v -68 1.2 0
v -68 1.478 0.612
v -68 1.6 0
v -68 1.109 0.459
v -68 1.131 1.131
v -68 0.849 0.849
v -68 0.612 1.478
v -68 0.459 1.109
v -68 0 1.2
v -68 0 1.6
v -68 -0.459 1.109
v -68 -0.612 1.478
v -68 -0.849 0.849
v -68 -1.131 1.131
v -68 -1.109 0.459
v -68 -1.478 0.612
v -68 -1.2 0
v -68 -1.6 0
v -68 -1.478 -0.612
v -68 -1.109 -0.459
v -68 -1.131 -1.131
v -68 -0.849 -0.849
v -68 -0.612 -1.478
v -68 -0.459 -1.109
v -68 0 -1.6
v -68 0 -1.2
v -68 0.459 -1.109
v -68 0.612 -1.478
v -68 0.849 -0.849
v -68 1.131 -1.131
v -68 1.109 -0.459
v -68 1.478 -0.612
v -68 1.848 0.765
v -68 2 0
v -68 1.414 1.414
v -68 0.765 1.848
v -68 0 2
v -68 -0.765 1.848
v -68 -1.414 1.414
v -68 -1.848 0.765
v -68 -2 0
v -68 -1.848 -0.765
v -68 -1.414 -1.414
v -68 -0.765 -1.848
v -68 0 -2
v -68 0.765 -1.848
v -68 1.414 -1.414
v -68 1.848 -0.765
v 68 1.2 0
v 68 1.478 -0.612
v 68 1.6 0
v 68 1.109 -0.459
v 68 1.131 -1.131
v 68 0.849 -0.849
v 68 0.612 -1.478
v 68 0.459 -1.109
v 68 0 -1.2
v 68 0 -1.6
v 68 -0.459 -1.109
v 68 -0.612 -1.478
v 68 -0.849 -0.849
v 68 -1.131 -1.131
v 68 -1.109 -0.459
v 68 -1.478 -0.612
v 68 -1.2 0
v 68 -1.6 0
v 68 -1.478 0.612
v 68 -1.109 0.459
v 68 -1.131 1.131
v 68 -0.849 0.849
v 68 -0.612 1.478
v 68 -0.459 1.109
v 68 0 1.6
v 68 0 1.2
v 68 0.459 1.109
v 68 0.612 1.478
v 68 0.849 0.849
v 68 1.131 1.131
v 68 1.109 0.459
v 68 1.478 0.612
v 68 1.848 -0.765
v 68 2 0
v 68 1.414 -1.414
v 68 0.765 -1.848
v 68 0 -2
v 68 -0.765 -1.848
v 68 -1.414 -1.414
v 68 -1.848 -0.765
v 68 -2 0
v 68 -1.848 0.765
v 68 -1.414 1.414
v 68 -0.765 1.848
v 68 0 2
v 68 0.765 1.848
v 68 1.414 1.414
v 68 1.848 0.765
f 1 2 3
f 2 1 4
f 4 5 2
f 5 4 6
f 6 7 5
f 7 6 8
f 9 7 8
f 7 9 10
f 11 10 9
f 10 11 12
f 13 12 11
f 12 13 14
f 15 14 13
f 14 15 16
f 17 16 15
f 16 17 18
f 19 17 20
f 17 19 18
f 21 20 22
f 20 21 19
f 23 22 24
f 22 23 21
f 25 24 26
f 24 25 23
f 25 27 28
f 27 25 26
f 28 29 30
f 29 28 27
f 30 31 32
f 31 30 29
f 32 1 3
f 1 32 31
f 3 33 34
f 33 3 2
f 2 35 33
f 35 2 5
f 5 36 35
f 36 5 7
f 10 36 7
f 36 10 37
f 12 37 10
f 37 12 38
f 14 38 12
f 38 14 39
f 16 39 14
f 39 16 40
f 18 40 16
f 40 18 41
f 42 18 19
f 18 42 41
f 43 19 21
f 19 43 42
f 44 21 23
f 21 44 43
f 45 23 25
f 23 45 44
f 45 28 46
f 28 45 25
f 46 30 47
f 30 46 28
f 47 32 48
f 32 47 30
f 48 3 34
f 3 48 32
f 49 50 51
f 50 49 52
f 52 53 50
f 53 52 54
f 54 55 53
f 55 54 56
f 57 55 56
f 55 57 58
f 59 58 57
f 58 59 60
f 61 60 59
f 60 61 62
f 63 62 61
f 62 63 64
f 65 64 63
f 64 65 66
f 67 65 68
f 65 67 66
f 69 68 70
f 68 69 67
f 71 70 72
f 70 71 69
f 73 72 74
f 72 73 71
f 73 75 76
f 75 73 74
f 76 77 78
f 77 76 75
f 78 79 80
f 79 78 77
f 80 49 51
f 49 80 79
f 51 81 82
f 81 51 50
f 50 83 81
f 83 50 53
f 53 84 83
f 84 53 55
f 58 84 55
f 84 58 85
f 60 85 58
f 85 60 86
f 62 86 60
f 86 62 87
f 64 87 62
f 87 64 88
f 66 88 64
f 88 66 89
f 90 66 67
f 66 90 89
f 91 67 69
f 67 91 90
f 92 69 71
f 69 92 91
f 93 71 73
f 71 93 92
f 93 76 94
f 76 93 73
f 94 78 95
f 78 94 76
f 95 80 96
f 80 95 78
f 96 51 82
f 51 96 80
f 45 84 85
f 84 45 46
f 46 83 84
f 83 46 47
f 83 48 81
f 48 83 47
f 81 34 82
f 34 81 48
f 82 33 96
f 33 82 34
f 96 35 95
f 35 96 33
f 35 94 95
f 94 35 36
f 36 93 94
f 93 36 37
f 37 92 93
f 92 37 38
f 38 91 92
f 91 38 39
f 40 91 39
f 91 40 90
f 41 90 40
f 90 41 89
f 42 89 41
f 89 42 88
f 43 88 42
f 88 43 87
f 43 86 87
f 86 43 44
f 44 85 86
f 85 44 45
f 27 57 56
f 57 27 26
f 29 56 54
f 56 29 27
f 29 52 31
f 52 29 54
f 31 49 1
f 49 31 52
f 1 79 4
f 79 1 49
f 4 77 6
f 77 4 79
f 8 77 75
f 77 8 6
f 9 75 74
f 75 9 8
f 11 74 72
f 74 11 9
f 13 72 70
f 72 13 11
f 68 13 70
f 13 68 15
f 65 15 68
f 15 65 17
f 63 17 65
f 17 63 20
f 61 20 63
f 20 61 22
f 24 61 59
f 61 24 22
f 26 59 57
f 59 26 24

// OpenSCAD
// file: ../p/4-4cyli.scad
use <../lib.scad>
function ldraw_lib__4_4cyli() = [
// 0 Cylinder 1.0
// 0 Name: 4-4cyli.dat
// 0 Author: James Jessiman
// 0 !LDRAW_ORG Primitive UPDATE 2005-01
// 0 !LICENSE Licensed under CC BY 2.0 and CC BY 4.0 : see CAreadme.txt
// 
// 0 BFC CERTIFY CCW
  [0,"BFC","CERTIFY"],
  [0,"BFC","CCW"],
// 
// 0 !HISTORY 1998-12-15 [PTadmin] Official Update 1998-10
// 0 !HISTORY 2002-03-23 [sbliss] Added BFC statement; merged headers from files in distributions LDraw 0.27 and Complete.
// 0 !HISTORY 2002-04-25 [PTadmin] Official Update 2002-02
// 0 !HISTORY 2004-12-14 [guyvivan] BFC CCW
// 0 !HISTORY 2005-12-28 [PTadmin] Official Update 2005-01
// 0 !HISTORY 2007-06-24 [PTadmin] Header formatted for Contributor Agreement
// 0 !HISTORY 2008-07-01 [PTadmin] Official Update 2008-01
// 
// 
// 4 16 1 1 0 0.9239 1 0.3827 0.9239 0 0.3827 1 0 0
  [4,16,1,1,0,0.9239,1,0.3827,0.9239,0,0.3827,1,0,0],
// 5 24 1 0 0 1 1 0 0.9239 0 0.3827 0.9239 0 -0.3827
  [5,24,1,0,0,1,1,0,0.9239,0,0.3827,0.9239,0,-0.3827],
// 4 16 0.9239 1 0.3827 0.7071 1 0.7071 0.7071 0 0.7071 0.9239 0 0.3827
  [4,16,0.9239,1,0.3827,0.7071,1,0.7071,0.7071,0,0.7071,0.9239,0,0.3827],
// 5 24 0.9239 0 0.3827 0.9239 1 0.3827 0.7071 0 0.7071 1 0 0
  [5,24,0.9239,0,0.3827,0.9239,1,0.3827,0.7071,0,0.7071,1,0,0],
// 4 16 0.7071 1 0.7071 0.3827 1 0.9239 0.3827 0 0.9239 0.7071 0 0.7071
  [4,16,0.7071,1,0.7071,0.3827,1,0.9239,0.3827,0,0.9239,0.7071,0,0.7071],
// 5 24 0.7071 0 0.7071 0.7071 1 0.7071 0.3827 0 0.9239 0.9239 0 0.3827
  [5,24,0.7071,0,0.7071,0.7071,1,0.7071,0.3827,0,0.9239,0.9239,0,0.3827],
// 4 16 0.3827 1 0.9239 0 1 1 0 0 1 0.3827 0 0.9239
  [4,16,0.3827,1,0.9239,0,1,1,0,0,1,0.3827,0,0.9239],
// 5 24 0.3827 0 0.9239 0.3827 1 0.9239 0 0 1 0.7071 0 0.7071
  [5,24,0.3827,0,0.9239,0.3827,1,0.9239,0,0,1,0.7071,0,0.7071],
// 4 16 0 1 1 -0.3827 1 0.9239 -0.3827 0 0.9239 0 0 1
  [4,16,0,1,1,-0.3827,1,0.9239,-0.3827,0,0.9239,0,0,1],
// 5 24 0 0 1 0 1 1 -0.3827 0 0.9239 0.3827 0 0.9239
  [5,24,0,0,1,0,1,1,-0.3827,0,0.9239,0.3827,0,0.9239],
// 4 16 -0.3827 1 0.9239 -0.7071 1 0.7071 -0.7071 0 0.7071 -0.3827 0 0.9239
  [4,16,-0.3827,1,0.9239,-0.7071,1,0.7071,-0.7071,0,0.7071,-0.3827,0,0.9239],
// 5 24 -0.3827 0 0.9239 -0.3827 1 0.9239 -0.7071 0 0.7071 0 0 1
  [5,24,-0.3827,0,0.9239,-0.3827,1,0.9239,-0.7071,0,0.7071,0,0,1],
// 4 16 -0.7071 1 0.7071 -0.9239 1 0.3827 -0.9239 0 0.3827 -0.7071 0 0.7071
  [4,16,-0.7071,1,0.7071,-0.9239,1,0.3827,-0.9239,0,0.3827,-0.7071,0,0.7071],
// 5 24 -0.7071 0 0.7071 -0.7071 1 0.7071 -0.9239 0 0.3827 -0.3827 0 0.9239
  [5,24,-0.7071,0,0.7071,-0.7071,1,0.7071,-0.9239,0,0.3827,-0.3827,0,0.9239],
// 4 16 -0.9239 1 0.3827 -1 1 0 -1 0 0 -0.9239 0 0.3827
  [4,16,-0.9239,1,0.3827,-1,1,0,-1,0,0,-0.9239,0,0.3827],
// 5 24 -0.9239 0 0.3827 -0.9239 1 0.3827 -1 0 0 -0.7071 0 0.7071
  [5,24,-0.9239,0,0.3827,-0.9239,1,0.3827,-1,0,0,-0.7071,0,0.7071],
// 4 16 -1 1 0 -0.9239 1 -0.3827 -0.9239 0 -0.3827 -1 0 0
  [4,16,-1,1,0,-0.9239,1,-0.3827,-0.9239,0,-0.3827,-1,0,0],
// 5 24 -1 0 0 -1 1 0 -0.9239 0 -0.3827 -0.9239 0 0.3827
  [5,24,-1,0,0,-1,1,0,-0.9239,0,-0.3827,-0.9239,0,0.3827],
// 4 16 -0.9239 1 -0.3827 -0.7071 1 -0.7071 -0.7071 0 -0.7071 -0.9239 0 -0.3827
  [4,16,-0.9239,1,-0.3827,-0.7071,1,-0.7071,-0.7071,0,-0.7071,-0.9239,0,-0.3827],
// 5 24 -0.9239 0 -0.3827 -0.9239 1 -0.3827 -0.7071 0 -0.7071 -1 0 0
  [5,24,-0.9239,0,-0.3827,-0.9239,1,-0.3827,-0.7071,0,-0.7071,-1,0,0],
// 4 16 -0.7071 1 -0.7071 -0.3827 1 -0.9239 -0.3827 0 -0.9239 -0.7071 0 -0.7071
  [4,16,-0.7071,1,-0.7071,-0.3827,1,-0.9239,-0.3827,0,-0.9239,-0.7071,0,-0.7071],
// 5 24 -0.7071 0 -0.7071 -0.7071 1 -0.7071 -0.3827 0 -0.9239 -0.9239 0 -0.3827
  [5,24,-0.7071,0,-0.7071,-0.7071,1,-0.7071,-0.3827,0,-0.9239,-0.9239,0,-0.3827],
// 4 16 -0.3827 1 -0.9239 0 1 -1 0 0 -1 -0.3827 0 -0.9239
  [4,16,-0.3827,1,-0.9239,0,1,-1,0,0,-1,-0.3827,0,-0.9239],
// 5 24 -0.3827 0 -0.9239 -0.3827 1 -0.9239 0 0 -1 -0.7071 0 -0.7071
  [5,24,-0.3827,0,-0.9239,-0.3827,1,-0.9239,0,0,-1,-0.7071,0,-0.7071],
// 4 16 0 1 -1 0.3827 1 -0.9239 0.3827 0 -0.9239 0 0 -1
  [4,16,0,1,-1,0.3827,1,-0.9239,0.3827,0,-0.9239,0,0,-1],
// 5 24 0 0 -1 0 1 -1 0.3827 0 -0.9239 -0.3827 0 -0.9239
  [5,24,0,0,-1,0,1,-1,0.3827,0,-0.9239,-0.3827,0,-0.9239],
// 4 16 0.3827 1 -0.9239 0.7071 1 -0.7071 0.7071 0 -0.7071 0.3827 0 -0.9239
  [4,16,0.3827,1,-0.9239,0.7071,1,-0.7071,0.7071,0,-0.7071,0.3827,0,-0.9239],
// 5 24 0.3827 0 -0.9239 0.3827 1 -0.9239 0.7071 0 -0.7071 0 0 -1
  [5,24,0.3827,0,-0.9239,0.3827,1,-0.9239,0.7071,0,-0.7071,0,0,-1],
// 4 16 0.7071 1 -0.7071 0.9239 1 -0.3827 0.9239 0 -0.3827 0.7071 0 -0.7071
  [4,16,0.7071,1,-0.7071,0.9239,1,-0.3827,0.9239,0,-0.3827,0.7071,0,-0.7071],
// 5 24 0.7071 0 -0.7071 0.7071 1 -0.7071 0.9239 0 -0.3827 0.3827 0 -0.9239
  [5,24,0.7071,0,-0.7071,0.7071,1,-0.7071,0.9239,0,-0.3827,0.3827,0,-0.9239],
// 4 16 0.9239 1 -0.3827 1 1 0 1 0 0 0.9239 0 -0.3827
  [4,16,0.9239,1,-0.3827,1,1,0,1,0,0,0.9239,0,-0.3827],
// 5 24 0.9239 0 -0.3827 0.9239 1 -0.3827 1 0 0 0.7071 0 -0.7071
  [5,24,0.9239,0,-0.3827,0.9239,1,-0.3827,1,0,0,0.7071,0,-0.7071],
// 0
];
makepoly(ldraw_lib__4_4cyli(), line=0.2);
// file: ../p/4-4ring4.scad
use <../lib.scad>
function ldraw_lib__4_4ring4() = [
// 0 Ring  4 x 1.0
// 0 Name: 4-4ring4.dat
// 0 Author: James Jessiman
// 0 !LDRAW_ORG Primitive UPDATE 2009-01
// 0 !LICENSE Licensed under CC BY 2.0 and CC BY 4.0 : see CAreadme.txt
// 
// 0 BFC CERTIFY CCW
  [0,"BFC","CERTIFY"],
  [0,"BFC","CCW"],
// 
// 0 !HISTORY 1998-12-15 [PTadmin] Official Update 1998-10
// 0 !HISTORY 2002-04-08 [BrickCaster] Modified for BFC compliance
// 0 !HISTORY 2002-04-25 [PTadmin] Official Update 2002-02
// 0 !HISTORY 2007-06-24 [PTadmin] Header formatted for Contributor Agreement
// 0 !HISTORY 2008-07-01 [PTadmin] Official Update 2008-01
// 0 !HISTORY 2008-08-26 [cwdee] Switch polygon winding and rename
// 0 !HISTORY 2009-05-02 [PTadmin] Official Update 2009-01
// 
// 
// 4 16 -1.9135 0 4.6195 -1.5308 0 3.6956 0 0 4 0 0 5
  [4,16,-1.9135,0,4.6195,-1.5308,0,3.6956,0,0,4,0,0,5],
// 4 16 -3.5355 0 3.5355 -2.8284 0 2.8284 -1.5308 0 3.6956 -1.9135 0 4.6195
  [4,16,-3.5355,0,3.5355,-2.8284,0,2.8284,-1.5308,0,3.6956,-1.9135,0,4.6195],
// 4 16 -4.6195 0 1.9135 -3.6956 0 1.5308 -2.8284 0 2.8284 -3.5355 0 3.5355
  [4,16,-4.6195,0,1.9135,-3.6956,0,1.5308,-2.8284,0,2.8284,-3.5355,0,3.5355],
// 4 16 -5 0 0 -4 0 0 -3.6956 0 1.5308 -4.6195 0 1.9135
  [4,16,-5,0,0,-4,0,0,-3.6956,0,1.5308,-4.6195,0,1.9135],
// 4 16 -4.6195 0 -1.9135 -3.6956 0 -1.5308 -4 0 0 -5 0 0
  [4,16,-4.6195,0,-1.9135,-3.6956,0,-1.5308,-4,0,0,-5,0,0],
// 4 16 -3.5355 0 -3.5355 -2.8284 0 -2.8284 -3.6956 0 -1.5308 -4.6195 0 -1.9135
  [4,16,-3.5355,0,-3.5355,-2.8284,0,-2.8284,-3.6956,0,-1.5308,-4.6195,0,-1.9135],
// 4 16 -1.9135 0 -4.6195 -1.5308 0 -3.6956 -2.8284 0 -2.8284 -3.5355 0 -3.5355
  [4,16,-1.9135,0,-4.6195,-1.5308,0,-3.6956,-2.8284,0,-2.8284,-3.5355,0,-3.5355],
// 4 16 0 0 -5 0 0 -4 -1.5308 0 -3.6956 -1.9135 0 -4.6195
  [4,16,0,0,-5,0,0,-4,-1.5308,0,-3.6956,-1.9135,0,-4.6195],
// 4 16 1.9135 0 -4.6195 1.5308 0 -3.6956 0 0 -4 0 0 -5
  [4,16,1.9135,0,-4.6195,1.5308,0,-3.6956,0,0,-4,0,0,-5],
// 4 16 3.5355 0 -3.5355 2.8284 0 -2.8284 1.5308 0 -3.6956 1.9135 0 -4.6195
  [4,16,3.5355,0,-3.5355,2.8284,0,-2.8284,1.5308,0,-3.6956,1.9135,0,-4.6195],
// 4 16 4.6195 0 -1.9135 3.6956 0 -1.5308 2.8284 0 -2.8284 3.5355 0 -3.5355
  [4,16,4.6195,0,-1.9135,3.6956,0,-1.5308,2.8284,0,-2.8284,3.5355,0,-3.5355],
// 4 16 5 0 0 4 0 0 3.6956 0 -1.5308 4.6195 0 -1.9135
  [4,16,5,0,0,4,0,0,3.6956,0,-1.5308,4.6195,0,-1.9135],
// 4 16 4.6195 0 1.9135 3.6956 0 1.5308 4 0 0 5 0 0
  [4,16,4.6195,0,1.9135,3.6956,0,1.5308,4,0,0,5,0,0],
// 4 16 3.5355 0 3.5355 2.8284 0 2.8284 3.6956 0 1.5308 4.6195 0 1.9135
  [4,16,3.5355,0,3.5355,2.8284,0,2.8284,3.6956,0,1.5308,4.6195,0,1.9135],
// 4 16 1.9135 0 4.6195 1.5308 0 3.6956 2.8284 0 2.8284 3.5355 0 3.5355
  [4,16,1.9135,0,4.6195,1.5308,0,3.6956,2.8284,0,2.8284,3.5355,0,3.5355],
// 4 16 0 0 5 0 0 4 1.5308 0 3.6956 1.9135 0 4.6195
  [4,16,0,0,5,0,0,4,1.5308,0,3.6956,1.9135,0,4.6195],
// 0
];
makepoly(ldraw_lib__4_4ring4(), line=0.2);
// file: ../p/4-4ring3.scad
use <../lib.scad>
function ldraw_lib__4_4ring3() = [
// 0 Ring  3 x 1.0
// 0 Name: 4-4ring3.dat
// 0 Author: James Jessiman
// 0 !LDRAW_ORG Primitive UPDATE 2009-01
// 0 !LICENSE Licensed under CC BY 2.0 and CC BY 4.0 : see CAreadme.txt
// 
// 0 BFC CERTIFY CCW
  [0,"BFC","CERTIFY"],
  [0,"BFC","CCW"],
// 
// 0 !HISTORY 1998-12-15 [PTadmin] Official Update 1998-10
// 0 !HISTORY 2002-04-05 [hafhead] Added BFC statement
// 0 !HISTORY 2002-04-25 [PTadmin] Official Update 2002-02
// 0 !HISTORY 2007-06-24 [PTadmin] Header formatted for Contributor Agreement
// 0 !HISTORY 2008-07-01 [PTadmin] Official Update 2008-01
// 0 !HISTORY 2008-08-26 [cwdee] Switch polygon winding and rename
// 0 !HISTORY 2009-05-02 [PTadmin] Official Update 2009-01
// 
// 
// 4 16 -1.5308 0 3.6956 -1.1481 0 2.7717 0 0 3 0 0 4
  [4,16,-1.5308,0,3.6956,-1.1481,0,2.7717,0,0,3,0,0,4],
// 4 16 -2.8284 0 2.8284 -2.1213 0 2.1213 -1.1481 0 2.7717 -1.5308 0 3.6956
  [4,16,-2.8284,0,2.8284,-2.1213,0,2.1213,-1.1481,0,2.7717,-1.5308,0,3.6956],
// 4 16 -3.6956 0 1.5308 -2.7717 0 1.1481 -2.1213 0 2.1213 -2.8284 0 2.8284
  [4,16,-3.6956,0,1.5308,-2.7717,0,1.1481,-2.1213,0,2.1213,-2.8284,0,2.8284],
// 4 16 -4 0 0 -3 0 0 -2.7717 0 1.1481 -3.6956 0 1.5308
  [4,16,-4,0,0,-3,0,0,-2.7717,0,1.1481,-3.6956,0,1.5308],
// 4 16 -3.6956 0 -1.5308 -2.7717 0 -1.1481 -3 0 0 -4 0 0
  [4,16,-3.6956,0,-1.5308,-2.7717,0,-1.1481,-3,0,0,-4,0,0],
// 4 16 -2.8284 0 -2.8284 -2.1213 0 -2.1213 -2.7717 0 -1.1481 -3.6956 0 -1.5308
  [4,16,-2.8284,0,-2.8284,-2.1213,0,-2.1213,-2.7717,0,-1.1481,-3.6956,0,-1.5308],
// 4 16 -1.5308 0 -3.6956 -1.1481 0 -2.7717 -2.1213 0 -2.1213 -2.8284 0 -2.8284
  [4,16,-1.5308,0,-3.6956,-1.1481,0,-2.7717,-2.1213,0,-2.1213,-2.8284,0,-2.8284],
// 4 16 0 0 -4 0 0 -3 -1.1481 0 -2.7717 -1.5308 0 -3.6956
  [4,16,0,0,-4,0,0,-3,-1.1481,0,-2.7717,-1.5308,0,-3.6956],
// 4 16 1.5308 0 -3.6956 1.1481 0 -2.7717 0 0 -3 0 0 -4
  [4,16,1.5308,0,-3.6956,1.1481,0,-2.7717,0,0,-3,0,0,-4],
// 4 16 2.8284 0 -2.8284 2.1213 0 -2.1213 1.1481 0 -2.7717 1.5308 0 -3.6956
  [4,16,2.8284,0,-2.8284,2.1213,0,-2.1213,1.1481,0,-2.7717,1.5308,0,-3.6956],
// 4 16 3.6956 0 -1.5308 2.7717 0 -1.1481 2.1213 0 -2.1213 2.8284 0 -2.8284
  [4,16,3.6956,0,-1.5308,2.7717,0,-1.1481,2.1213,0,-2.1213,2.8284,0,-2.8284],
// 4 16 4 0 0 3 0 0 2.7717 0 -1.1481 3.6956 0 -1.5308
  [4,16,4,0,0,3,0,0,2.7717,0,-1.1481,3.6956,0,-1.5308],
// 4 16 3.6956 0 1.5308 2.7717 0 1.1481 3 0 0 4 0 0
  [4,16,3.6956,0,1.5308,2.7717,0,1.1481,3,0,0,4,0,0],
// 4 16 2.8284 0 2.8284 2.1213 0 2.1213 2.7717 0 1.1481 3.6956 0 1.5308
  [4,16,2.8284,0,2.8284,2.1213,0,2.1213,2.7717,0,1.1481,3.6956,0,1.5308],
// 4 16 1.5308 0 3.6956 1.1481 0 2.7717 2.1213 0 2.1213 2.8284 0 2.8284
  [4,16,1.5308,0,3.6956,1.1481,0,2.7717,2.1213,0,2.1213,2.8284,0,2.8284],
// 4 16 0 0 4 0 0 3 1.1481 0 2.7717 1.5308 0 3.6956
  [4,16,0,0,4,0,0,3,1.1481,0,2.7717,1.5308,0,3.6956],
// 0
];
makepoly(ldraw_lib__4_4ring3(), line=0.2);
// file: ../p/4-4edge.scad
use <../lib.scad>
function ldraw_lib__4_4edge() = [
// 0 Circle 1.0
// 0 Name: 4-4edge.dat
// 0 Author: James Jessiman
// 0 !LDRAW_ORG Primitive UPDATE 2017-01
// 0 !LICENSE Licensed under CC BY 2.0 and CC BY 4.0 : see CAreadme.txt
// 
// 0 BFC CERTIFY CCW
  [0,"BFC","CERTIFY"],
  [0,"BFC","CCW"],
// 
// 0 !HISTORY 1998-12-15 [PTadmin] Official Update 1998-10
// 0 !HISTORY 2005-12-28 [PTadmin] Official Update 2005-01
// 0 !HISTORY 2007-06-24 [PTadmin] Header formatted for Contributor Agreement
// 0 !HISTORY 2008-07-01 [PTadmin] Official Update 2008-01
// 0 !HISTORY 2017-01-15 [Steffen] BFCed
// 0 !HISTORY 2017-12-30 [PTadmin] Official Update 2017-01
// 
// 
// 2 24 1 0 0 0.9239 0 0.3827
  [2,24,1,0,0,0.9239,0,0.3827],
// 2 24 0.9239 0 0.3827 0.7071 0 0.7071
  [2,24,0.9239,0,0.3827,0.7071,0,0.7071],
// 2 24 0.7071 0 0.7071 0.3827 0 0.9239
  [2,24,0.7071,0,0.7071,0.3827,0,0.9239],
// 2 24 0.3827 0 0.9239 0 0 1
  [2,24,0.3827,0,0.9239,0,0,1],
// 2 24 0 0 1 -0.3827 0 0.9239
  [2,24,0,0,1,-0.3827,0,0.9239],
// 2 24 -0.3827 0 0.9239 -0.7071 0 0.7071
  [2,24,-0.3827,0,0.9239,-0.7071,0,0.7071],
// 2 24 -0.7071 0 0.7071 -0.9239 0 0.3827
  [2,24,-0.7071,0,0.7071,-0.9239,0,0.3827],
// 2 24 -0.9239 0 0.3827 -1 0 -0
  [2,24,-0.9239,0,0.3827,-1,0,-0],
// 2 24 -1 0 -0 -0.9239 0 -0.3827
  [2,24,-1,0,-0,-0.9239,0,-0.3827],
// 2 24 -0.9239 0 -0.3827 -0.7071 0 -0.7071
  [2,24,-0.9239,0,-0.3827,-0.7071,0,-0.7071],
// 2 24 -0.7071 0 -0.7071 -0.3827 0 -0.9239
  [2,24,-0.7071,0,-0.7071,-0.3827,0,-0.9239],
// 2 24 -0.3827 0 -0.9239 0 0 -1
  [2,24,-0.3827,0,-0.9239,0,0,-1],
// 2 24 0 0 -1 0.3827 0 -0.9239
  [2,24,0,0,-1,0.3827,0,-0.9239],
// 2 24 0.3827 0 -0.9239 0.7071 0 -0.7071
  [2,24,0.3827,0,-0.9239,0.7071,0,-0.7071],
// 2 24 0.7071 0 -0.7071 0.9239 0 -0.3827
  [2,24,0.7071,0,-0.7071,0.9239,0,-0.3827],
// 2 24 0.9239 0 -0.3827 1 0 0
  [2,24,0.9239,0,-0.3827,1,0,0],
];
makepoly(ldraw_lib__4_4edge(), line=0.2);
// file: 71533k03.scad
use <../lib.scad>
use <../p/4-4cyli.scad>
function ldraw_lib__71533k03() = [
// 0 ~Technic Pneumatic Tube Segment
// 0 Name: 71533k03.dat
// 0 Author: Jaco van der Molen [Jaco]
// 0 !LDRAW_ORG Part Flexible_Section UPDATE 2020-01
// 0 !LICENSE Licensed under CC BY 2.0 and CC BY 4.0 : see CAreadme.txt
// 
// 0 BFC CERTIFY CW
  [0,"BFC","CERTIFY"],
  [0,"BFC","CW"],
// 
// 0 !HISTORY 2003-11-30 [Steffen] BFCed
// 0 !HISTORY 2009-12-29 [PTadmin] Official Update 2009-03
// 0 !HISTORY 2020-06-27 [PTadmin] Renamed from 166
// 0 !HISTORY 2020-06-28 [PTadmin] Official Update 2020-01
// 
// 
// 1 16 0 0 0 5 0 0 0 1 0 0 0 5 4-4cyli.dat
  [1,16,0,0,0,5,0,0,0,1,0,0,0,5, ldraw_lib__4_4cyli()],
// 0 BFC INVERTNEXT
  [0,"BFC","INVERTNEXT"],
// 1 16 0 0 0 3 0 0 0 1 0 0 0 3 4-4cyli.dat
  [1,16,0,0,0,3,0,0,0,1,0,0,0,3, ldraw_lib__4_4cyli()],
// 0
];
makepoly(ldraw_lib__71533k03(), line=0.2);
// file: 71533k02.scad
use <../lib.scad>
use <../p/4-4edge.scad>
use <../p/4-4ring3.scad>
use <../p/4-4ring4.scad>
function ldraw_lib__71533k02() = [
// 0 ~Technic Pneumatic Tube End (Non-Bulged)
// 0 Name: 71533k02.dat
// 0 Author: Steffen [Steffen]
// 0 !LDRAW_ORG Part Flexible_Section UPDATE 2020-01
// 0 !LICENSE Licensed under CC BY 2.0 and CC BY 4.0 : see CAreadme.txt
// 
// 0 BFC CERTIFY CCW
  [0,"BFC","CERTIFY"],
  [0,"BFC","CCW"],
// 
// 0 !HISTORY 2020-06-28 [PTadmin] Official Update 2020-01
// 
// 
// 0 // This file goes together with 71533k01.dat and 71533k03.dat.
// 0 // Those 3 files can be used to create Technic Pneumatic Tubes
// 0 // with either bulged or non-bulged ends.
// 
// 1 16 0 0 0 1 0 0 0 1 0 0 0 1 4-4ring3.dat
  [1,16,0,0,0,1,0,0,0,1,0,0,0,1, ldraw_lib__4_4ring3()],
// 1 16 0 0 0 1 0 0 0 1 0 0 0 1 4-4ring4.dat
  [1,16,0,0,0,1,0,0,0,1,0,0,0,1, ldraw_lib__4_4ring4()],
// 1 16 0 0 0 3 0 0 0 3 0 0 0 3 4-4edge.dat
  [1,16,0,0,0,3,0,0,0,3,0,0,0,3, ldraw_lib__4_4edge()],
// 1 16 0 0 0 5 0 0 0 5 0 0 0 5 4-4edge.dat
  [1,16,0,0,0,5,0,0,0,5,0,0,0,5, ldraw_lib__4_4edge()],
];
makepoly(ldraw_lib__71533k02(), line=0.2);
// main file
use <../lib.scad>
use <71533k02.scad>
use <71533k03.scad>
function ldraw_lib__53168_f1() = [
// 0 Technic Pneumatic Tube 17L
// 0 Name: 53168-f1.dat
// 0 Author: Philippe Hurbain [Philo]
// 0 !LDRAW_ORG Part UPDATE 2020-02
// 0 !LICENSE Licensed under CC BY 2.0 and CC BY 4.0 : see CAreadme.txt
// 
// 0 BFC CERTIFY CCW
  [0,"BFC","CERTIFY"],
  [0,"BFC","CCW"],
// 
// 0 !KEYWORDS 136 mm
// 
// 0 !HISTORY 2020-09-05 [PTadmin] Official Update 2020-02
// 
// 
// 1 16 -170 0 0 0 1 0 1 0 0 0 0 1 71533k02.dat
  [1,16,-170,0,0,0,1,0,1,0,0,0,0,1, ldraw_lib__71533k02()],
// 1 16 170 0 0 0 -1 0 -1 0 0 0 0 1 71533k02.dat
  [1,16,170,0,0,0,-1,0,-1,0,0,0,0,1, ldraw_lib__71533k02()],
// 1 16 -170 0 0 0 340 0 1 0 0 0 0 1 71533k03.dat
  [1,16,-170,0,0,0,340,0,1,0,0,0,0,1, ldraw_lib__71533k03()],
];
makepoly(ldraw_lib__53168_f1(), line=0.2);
